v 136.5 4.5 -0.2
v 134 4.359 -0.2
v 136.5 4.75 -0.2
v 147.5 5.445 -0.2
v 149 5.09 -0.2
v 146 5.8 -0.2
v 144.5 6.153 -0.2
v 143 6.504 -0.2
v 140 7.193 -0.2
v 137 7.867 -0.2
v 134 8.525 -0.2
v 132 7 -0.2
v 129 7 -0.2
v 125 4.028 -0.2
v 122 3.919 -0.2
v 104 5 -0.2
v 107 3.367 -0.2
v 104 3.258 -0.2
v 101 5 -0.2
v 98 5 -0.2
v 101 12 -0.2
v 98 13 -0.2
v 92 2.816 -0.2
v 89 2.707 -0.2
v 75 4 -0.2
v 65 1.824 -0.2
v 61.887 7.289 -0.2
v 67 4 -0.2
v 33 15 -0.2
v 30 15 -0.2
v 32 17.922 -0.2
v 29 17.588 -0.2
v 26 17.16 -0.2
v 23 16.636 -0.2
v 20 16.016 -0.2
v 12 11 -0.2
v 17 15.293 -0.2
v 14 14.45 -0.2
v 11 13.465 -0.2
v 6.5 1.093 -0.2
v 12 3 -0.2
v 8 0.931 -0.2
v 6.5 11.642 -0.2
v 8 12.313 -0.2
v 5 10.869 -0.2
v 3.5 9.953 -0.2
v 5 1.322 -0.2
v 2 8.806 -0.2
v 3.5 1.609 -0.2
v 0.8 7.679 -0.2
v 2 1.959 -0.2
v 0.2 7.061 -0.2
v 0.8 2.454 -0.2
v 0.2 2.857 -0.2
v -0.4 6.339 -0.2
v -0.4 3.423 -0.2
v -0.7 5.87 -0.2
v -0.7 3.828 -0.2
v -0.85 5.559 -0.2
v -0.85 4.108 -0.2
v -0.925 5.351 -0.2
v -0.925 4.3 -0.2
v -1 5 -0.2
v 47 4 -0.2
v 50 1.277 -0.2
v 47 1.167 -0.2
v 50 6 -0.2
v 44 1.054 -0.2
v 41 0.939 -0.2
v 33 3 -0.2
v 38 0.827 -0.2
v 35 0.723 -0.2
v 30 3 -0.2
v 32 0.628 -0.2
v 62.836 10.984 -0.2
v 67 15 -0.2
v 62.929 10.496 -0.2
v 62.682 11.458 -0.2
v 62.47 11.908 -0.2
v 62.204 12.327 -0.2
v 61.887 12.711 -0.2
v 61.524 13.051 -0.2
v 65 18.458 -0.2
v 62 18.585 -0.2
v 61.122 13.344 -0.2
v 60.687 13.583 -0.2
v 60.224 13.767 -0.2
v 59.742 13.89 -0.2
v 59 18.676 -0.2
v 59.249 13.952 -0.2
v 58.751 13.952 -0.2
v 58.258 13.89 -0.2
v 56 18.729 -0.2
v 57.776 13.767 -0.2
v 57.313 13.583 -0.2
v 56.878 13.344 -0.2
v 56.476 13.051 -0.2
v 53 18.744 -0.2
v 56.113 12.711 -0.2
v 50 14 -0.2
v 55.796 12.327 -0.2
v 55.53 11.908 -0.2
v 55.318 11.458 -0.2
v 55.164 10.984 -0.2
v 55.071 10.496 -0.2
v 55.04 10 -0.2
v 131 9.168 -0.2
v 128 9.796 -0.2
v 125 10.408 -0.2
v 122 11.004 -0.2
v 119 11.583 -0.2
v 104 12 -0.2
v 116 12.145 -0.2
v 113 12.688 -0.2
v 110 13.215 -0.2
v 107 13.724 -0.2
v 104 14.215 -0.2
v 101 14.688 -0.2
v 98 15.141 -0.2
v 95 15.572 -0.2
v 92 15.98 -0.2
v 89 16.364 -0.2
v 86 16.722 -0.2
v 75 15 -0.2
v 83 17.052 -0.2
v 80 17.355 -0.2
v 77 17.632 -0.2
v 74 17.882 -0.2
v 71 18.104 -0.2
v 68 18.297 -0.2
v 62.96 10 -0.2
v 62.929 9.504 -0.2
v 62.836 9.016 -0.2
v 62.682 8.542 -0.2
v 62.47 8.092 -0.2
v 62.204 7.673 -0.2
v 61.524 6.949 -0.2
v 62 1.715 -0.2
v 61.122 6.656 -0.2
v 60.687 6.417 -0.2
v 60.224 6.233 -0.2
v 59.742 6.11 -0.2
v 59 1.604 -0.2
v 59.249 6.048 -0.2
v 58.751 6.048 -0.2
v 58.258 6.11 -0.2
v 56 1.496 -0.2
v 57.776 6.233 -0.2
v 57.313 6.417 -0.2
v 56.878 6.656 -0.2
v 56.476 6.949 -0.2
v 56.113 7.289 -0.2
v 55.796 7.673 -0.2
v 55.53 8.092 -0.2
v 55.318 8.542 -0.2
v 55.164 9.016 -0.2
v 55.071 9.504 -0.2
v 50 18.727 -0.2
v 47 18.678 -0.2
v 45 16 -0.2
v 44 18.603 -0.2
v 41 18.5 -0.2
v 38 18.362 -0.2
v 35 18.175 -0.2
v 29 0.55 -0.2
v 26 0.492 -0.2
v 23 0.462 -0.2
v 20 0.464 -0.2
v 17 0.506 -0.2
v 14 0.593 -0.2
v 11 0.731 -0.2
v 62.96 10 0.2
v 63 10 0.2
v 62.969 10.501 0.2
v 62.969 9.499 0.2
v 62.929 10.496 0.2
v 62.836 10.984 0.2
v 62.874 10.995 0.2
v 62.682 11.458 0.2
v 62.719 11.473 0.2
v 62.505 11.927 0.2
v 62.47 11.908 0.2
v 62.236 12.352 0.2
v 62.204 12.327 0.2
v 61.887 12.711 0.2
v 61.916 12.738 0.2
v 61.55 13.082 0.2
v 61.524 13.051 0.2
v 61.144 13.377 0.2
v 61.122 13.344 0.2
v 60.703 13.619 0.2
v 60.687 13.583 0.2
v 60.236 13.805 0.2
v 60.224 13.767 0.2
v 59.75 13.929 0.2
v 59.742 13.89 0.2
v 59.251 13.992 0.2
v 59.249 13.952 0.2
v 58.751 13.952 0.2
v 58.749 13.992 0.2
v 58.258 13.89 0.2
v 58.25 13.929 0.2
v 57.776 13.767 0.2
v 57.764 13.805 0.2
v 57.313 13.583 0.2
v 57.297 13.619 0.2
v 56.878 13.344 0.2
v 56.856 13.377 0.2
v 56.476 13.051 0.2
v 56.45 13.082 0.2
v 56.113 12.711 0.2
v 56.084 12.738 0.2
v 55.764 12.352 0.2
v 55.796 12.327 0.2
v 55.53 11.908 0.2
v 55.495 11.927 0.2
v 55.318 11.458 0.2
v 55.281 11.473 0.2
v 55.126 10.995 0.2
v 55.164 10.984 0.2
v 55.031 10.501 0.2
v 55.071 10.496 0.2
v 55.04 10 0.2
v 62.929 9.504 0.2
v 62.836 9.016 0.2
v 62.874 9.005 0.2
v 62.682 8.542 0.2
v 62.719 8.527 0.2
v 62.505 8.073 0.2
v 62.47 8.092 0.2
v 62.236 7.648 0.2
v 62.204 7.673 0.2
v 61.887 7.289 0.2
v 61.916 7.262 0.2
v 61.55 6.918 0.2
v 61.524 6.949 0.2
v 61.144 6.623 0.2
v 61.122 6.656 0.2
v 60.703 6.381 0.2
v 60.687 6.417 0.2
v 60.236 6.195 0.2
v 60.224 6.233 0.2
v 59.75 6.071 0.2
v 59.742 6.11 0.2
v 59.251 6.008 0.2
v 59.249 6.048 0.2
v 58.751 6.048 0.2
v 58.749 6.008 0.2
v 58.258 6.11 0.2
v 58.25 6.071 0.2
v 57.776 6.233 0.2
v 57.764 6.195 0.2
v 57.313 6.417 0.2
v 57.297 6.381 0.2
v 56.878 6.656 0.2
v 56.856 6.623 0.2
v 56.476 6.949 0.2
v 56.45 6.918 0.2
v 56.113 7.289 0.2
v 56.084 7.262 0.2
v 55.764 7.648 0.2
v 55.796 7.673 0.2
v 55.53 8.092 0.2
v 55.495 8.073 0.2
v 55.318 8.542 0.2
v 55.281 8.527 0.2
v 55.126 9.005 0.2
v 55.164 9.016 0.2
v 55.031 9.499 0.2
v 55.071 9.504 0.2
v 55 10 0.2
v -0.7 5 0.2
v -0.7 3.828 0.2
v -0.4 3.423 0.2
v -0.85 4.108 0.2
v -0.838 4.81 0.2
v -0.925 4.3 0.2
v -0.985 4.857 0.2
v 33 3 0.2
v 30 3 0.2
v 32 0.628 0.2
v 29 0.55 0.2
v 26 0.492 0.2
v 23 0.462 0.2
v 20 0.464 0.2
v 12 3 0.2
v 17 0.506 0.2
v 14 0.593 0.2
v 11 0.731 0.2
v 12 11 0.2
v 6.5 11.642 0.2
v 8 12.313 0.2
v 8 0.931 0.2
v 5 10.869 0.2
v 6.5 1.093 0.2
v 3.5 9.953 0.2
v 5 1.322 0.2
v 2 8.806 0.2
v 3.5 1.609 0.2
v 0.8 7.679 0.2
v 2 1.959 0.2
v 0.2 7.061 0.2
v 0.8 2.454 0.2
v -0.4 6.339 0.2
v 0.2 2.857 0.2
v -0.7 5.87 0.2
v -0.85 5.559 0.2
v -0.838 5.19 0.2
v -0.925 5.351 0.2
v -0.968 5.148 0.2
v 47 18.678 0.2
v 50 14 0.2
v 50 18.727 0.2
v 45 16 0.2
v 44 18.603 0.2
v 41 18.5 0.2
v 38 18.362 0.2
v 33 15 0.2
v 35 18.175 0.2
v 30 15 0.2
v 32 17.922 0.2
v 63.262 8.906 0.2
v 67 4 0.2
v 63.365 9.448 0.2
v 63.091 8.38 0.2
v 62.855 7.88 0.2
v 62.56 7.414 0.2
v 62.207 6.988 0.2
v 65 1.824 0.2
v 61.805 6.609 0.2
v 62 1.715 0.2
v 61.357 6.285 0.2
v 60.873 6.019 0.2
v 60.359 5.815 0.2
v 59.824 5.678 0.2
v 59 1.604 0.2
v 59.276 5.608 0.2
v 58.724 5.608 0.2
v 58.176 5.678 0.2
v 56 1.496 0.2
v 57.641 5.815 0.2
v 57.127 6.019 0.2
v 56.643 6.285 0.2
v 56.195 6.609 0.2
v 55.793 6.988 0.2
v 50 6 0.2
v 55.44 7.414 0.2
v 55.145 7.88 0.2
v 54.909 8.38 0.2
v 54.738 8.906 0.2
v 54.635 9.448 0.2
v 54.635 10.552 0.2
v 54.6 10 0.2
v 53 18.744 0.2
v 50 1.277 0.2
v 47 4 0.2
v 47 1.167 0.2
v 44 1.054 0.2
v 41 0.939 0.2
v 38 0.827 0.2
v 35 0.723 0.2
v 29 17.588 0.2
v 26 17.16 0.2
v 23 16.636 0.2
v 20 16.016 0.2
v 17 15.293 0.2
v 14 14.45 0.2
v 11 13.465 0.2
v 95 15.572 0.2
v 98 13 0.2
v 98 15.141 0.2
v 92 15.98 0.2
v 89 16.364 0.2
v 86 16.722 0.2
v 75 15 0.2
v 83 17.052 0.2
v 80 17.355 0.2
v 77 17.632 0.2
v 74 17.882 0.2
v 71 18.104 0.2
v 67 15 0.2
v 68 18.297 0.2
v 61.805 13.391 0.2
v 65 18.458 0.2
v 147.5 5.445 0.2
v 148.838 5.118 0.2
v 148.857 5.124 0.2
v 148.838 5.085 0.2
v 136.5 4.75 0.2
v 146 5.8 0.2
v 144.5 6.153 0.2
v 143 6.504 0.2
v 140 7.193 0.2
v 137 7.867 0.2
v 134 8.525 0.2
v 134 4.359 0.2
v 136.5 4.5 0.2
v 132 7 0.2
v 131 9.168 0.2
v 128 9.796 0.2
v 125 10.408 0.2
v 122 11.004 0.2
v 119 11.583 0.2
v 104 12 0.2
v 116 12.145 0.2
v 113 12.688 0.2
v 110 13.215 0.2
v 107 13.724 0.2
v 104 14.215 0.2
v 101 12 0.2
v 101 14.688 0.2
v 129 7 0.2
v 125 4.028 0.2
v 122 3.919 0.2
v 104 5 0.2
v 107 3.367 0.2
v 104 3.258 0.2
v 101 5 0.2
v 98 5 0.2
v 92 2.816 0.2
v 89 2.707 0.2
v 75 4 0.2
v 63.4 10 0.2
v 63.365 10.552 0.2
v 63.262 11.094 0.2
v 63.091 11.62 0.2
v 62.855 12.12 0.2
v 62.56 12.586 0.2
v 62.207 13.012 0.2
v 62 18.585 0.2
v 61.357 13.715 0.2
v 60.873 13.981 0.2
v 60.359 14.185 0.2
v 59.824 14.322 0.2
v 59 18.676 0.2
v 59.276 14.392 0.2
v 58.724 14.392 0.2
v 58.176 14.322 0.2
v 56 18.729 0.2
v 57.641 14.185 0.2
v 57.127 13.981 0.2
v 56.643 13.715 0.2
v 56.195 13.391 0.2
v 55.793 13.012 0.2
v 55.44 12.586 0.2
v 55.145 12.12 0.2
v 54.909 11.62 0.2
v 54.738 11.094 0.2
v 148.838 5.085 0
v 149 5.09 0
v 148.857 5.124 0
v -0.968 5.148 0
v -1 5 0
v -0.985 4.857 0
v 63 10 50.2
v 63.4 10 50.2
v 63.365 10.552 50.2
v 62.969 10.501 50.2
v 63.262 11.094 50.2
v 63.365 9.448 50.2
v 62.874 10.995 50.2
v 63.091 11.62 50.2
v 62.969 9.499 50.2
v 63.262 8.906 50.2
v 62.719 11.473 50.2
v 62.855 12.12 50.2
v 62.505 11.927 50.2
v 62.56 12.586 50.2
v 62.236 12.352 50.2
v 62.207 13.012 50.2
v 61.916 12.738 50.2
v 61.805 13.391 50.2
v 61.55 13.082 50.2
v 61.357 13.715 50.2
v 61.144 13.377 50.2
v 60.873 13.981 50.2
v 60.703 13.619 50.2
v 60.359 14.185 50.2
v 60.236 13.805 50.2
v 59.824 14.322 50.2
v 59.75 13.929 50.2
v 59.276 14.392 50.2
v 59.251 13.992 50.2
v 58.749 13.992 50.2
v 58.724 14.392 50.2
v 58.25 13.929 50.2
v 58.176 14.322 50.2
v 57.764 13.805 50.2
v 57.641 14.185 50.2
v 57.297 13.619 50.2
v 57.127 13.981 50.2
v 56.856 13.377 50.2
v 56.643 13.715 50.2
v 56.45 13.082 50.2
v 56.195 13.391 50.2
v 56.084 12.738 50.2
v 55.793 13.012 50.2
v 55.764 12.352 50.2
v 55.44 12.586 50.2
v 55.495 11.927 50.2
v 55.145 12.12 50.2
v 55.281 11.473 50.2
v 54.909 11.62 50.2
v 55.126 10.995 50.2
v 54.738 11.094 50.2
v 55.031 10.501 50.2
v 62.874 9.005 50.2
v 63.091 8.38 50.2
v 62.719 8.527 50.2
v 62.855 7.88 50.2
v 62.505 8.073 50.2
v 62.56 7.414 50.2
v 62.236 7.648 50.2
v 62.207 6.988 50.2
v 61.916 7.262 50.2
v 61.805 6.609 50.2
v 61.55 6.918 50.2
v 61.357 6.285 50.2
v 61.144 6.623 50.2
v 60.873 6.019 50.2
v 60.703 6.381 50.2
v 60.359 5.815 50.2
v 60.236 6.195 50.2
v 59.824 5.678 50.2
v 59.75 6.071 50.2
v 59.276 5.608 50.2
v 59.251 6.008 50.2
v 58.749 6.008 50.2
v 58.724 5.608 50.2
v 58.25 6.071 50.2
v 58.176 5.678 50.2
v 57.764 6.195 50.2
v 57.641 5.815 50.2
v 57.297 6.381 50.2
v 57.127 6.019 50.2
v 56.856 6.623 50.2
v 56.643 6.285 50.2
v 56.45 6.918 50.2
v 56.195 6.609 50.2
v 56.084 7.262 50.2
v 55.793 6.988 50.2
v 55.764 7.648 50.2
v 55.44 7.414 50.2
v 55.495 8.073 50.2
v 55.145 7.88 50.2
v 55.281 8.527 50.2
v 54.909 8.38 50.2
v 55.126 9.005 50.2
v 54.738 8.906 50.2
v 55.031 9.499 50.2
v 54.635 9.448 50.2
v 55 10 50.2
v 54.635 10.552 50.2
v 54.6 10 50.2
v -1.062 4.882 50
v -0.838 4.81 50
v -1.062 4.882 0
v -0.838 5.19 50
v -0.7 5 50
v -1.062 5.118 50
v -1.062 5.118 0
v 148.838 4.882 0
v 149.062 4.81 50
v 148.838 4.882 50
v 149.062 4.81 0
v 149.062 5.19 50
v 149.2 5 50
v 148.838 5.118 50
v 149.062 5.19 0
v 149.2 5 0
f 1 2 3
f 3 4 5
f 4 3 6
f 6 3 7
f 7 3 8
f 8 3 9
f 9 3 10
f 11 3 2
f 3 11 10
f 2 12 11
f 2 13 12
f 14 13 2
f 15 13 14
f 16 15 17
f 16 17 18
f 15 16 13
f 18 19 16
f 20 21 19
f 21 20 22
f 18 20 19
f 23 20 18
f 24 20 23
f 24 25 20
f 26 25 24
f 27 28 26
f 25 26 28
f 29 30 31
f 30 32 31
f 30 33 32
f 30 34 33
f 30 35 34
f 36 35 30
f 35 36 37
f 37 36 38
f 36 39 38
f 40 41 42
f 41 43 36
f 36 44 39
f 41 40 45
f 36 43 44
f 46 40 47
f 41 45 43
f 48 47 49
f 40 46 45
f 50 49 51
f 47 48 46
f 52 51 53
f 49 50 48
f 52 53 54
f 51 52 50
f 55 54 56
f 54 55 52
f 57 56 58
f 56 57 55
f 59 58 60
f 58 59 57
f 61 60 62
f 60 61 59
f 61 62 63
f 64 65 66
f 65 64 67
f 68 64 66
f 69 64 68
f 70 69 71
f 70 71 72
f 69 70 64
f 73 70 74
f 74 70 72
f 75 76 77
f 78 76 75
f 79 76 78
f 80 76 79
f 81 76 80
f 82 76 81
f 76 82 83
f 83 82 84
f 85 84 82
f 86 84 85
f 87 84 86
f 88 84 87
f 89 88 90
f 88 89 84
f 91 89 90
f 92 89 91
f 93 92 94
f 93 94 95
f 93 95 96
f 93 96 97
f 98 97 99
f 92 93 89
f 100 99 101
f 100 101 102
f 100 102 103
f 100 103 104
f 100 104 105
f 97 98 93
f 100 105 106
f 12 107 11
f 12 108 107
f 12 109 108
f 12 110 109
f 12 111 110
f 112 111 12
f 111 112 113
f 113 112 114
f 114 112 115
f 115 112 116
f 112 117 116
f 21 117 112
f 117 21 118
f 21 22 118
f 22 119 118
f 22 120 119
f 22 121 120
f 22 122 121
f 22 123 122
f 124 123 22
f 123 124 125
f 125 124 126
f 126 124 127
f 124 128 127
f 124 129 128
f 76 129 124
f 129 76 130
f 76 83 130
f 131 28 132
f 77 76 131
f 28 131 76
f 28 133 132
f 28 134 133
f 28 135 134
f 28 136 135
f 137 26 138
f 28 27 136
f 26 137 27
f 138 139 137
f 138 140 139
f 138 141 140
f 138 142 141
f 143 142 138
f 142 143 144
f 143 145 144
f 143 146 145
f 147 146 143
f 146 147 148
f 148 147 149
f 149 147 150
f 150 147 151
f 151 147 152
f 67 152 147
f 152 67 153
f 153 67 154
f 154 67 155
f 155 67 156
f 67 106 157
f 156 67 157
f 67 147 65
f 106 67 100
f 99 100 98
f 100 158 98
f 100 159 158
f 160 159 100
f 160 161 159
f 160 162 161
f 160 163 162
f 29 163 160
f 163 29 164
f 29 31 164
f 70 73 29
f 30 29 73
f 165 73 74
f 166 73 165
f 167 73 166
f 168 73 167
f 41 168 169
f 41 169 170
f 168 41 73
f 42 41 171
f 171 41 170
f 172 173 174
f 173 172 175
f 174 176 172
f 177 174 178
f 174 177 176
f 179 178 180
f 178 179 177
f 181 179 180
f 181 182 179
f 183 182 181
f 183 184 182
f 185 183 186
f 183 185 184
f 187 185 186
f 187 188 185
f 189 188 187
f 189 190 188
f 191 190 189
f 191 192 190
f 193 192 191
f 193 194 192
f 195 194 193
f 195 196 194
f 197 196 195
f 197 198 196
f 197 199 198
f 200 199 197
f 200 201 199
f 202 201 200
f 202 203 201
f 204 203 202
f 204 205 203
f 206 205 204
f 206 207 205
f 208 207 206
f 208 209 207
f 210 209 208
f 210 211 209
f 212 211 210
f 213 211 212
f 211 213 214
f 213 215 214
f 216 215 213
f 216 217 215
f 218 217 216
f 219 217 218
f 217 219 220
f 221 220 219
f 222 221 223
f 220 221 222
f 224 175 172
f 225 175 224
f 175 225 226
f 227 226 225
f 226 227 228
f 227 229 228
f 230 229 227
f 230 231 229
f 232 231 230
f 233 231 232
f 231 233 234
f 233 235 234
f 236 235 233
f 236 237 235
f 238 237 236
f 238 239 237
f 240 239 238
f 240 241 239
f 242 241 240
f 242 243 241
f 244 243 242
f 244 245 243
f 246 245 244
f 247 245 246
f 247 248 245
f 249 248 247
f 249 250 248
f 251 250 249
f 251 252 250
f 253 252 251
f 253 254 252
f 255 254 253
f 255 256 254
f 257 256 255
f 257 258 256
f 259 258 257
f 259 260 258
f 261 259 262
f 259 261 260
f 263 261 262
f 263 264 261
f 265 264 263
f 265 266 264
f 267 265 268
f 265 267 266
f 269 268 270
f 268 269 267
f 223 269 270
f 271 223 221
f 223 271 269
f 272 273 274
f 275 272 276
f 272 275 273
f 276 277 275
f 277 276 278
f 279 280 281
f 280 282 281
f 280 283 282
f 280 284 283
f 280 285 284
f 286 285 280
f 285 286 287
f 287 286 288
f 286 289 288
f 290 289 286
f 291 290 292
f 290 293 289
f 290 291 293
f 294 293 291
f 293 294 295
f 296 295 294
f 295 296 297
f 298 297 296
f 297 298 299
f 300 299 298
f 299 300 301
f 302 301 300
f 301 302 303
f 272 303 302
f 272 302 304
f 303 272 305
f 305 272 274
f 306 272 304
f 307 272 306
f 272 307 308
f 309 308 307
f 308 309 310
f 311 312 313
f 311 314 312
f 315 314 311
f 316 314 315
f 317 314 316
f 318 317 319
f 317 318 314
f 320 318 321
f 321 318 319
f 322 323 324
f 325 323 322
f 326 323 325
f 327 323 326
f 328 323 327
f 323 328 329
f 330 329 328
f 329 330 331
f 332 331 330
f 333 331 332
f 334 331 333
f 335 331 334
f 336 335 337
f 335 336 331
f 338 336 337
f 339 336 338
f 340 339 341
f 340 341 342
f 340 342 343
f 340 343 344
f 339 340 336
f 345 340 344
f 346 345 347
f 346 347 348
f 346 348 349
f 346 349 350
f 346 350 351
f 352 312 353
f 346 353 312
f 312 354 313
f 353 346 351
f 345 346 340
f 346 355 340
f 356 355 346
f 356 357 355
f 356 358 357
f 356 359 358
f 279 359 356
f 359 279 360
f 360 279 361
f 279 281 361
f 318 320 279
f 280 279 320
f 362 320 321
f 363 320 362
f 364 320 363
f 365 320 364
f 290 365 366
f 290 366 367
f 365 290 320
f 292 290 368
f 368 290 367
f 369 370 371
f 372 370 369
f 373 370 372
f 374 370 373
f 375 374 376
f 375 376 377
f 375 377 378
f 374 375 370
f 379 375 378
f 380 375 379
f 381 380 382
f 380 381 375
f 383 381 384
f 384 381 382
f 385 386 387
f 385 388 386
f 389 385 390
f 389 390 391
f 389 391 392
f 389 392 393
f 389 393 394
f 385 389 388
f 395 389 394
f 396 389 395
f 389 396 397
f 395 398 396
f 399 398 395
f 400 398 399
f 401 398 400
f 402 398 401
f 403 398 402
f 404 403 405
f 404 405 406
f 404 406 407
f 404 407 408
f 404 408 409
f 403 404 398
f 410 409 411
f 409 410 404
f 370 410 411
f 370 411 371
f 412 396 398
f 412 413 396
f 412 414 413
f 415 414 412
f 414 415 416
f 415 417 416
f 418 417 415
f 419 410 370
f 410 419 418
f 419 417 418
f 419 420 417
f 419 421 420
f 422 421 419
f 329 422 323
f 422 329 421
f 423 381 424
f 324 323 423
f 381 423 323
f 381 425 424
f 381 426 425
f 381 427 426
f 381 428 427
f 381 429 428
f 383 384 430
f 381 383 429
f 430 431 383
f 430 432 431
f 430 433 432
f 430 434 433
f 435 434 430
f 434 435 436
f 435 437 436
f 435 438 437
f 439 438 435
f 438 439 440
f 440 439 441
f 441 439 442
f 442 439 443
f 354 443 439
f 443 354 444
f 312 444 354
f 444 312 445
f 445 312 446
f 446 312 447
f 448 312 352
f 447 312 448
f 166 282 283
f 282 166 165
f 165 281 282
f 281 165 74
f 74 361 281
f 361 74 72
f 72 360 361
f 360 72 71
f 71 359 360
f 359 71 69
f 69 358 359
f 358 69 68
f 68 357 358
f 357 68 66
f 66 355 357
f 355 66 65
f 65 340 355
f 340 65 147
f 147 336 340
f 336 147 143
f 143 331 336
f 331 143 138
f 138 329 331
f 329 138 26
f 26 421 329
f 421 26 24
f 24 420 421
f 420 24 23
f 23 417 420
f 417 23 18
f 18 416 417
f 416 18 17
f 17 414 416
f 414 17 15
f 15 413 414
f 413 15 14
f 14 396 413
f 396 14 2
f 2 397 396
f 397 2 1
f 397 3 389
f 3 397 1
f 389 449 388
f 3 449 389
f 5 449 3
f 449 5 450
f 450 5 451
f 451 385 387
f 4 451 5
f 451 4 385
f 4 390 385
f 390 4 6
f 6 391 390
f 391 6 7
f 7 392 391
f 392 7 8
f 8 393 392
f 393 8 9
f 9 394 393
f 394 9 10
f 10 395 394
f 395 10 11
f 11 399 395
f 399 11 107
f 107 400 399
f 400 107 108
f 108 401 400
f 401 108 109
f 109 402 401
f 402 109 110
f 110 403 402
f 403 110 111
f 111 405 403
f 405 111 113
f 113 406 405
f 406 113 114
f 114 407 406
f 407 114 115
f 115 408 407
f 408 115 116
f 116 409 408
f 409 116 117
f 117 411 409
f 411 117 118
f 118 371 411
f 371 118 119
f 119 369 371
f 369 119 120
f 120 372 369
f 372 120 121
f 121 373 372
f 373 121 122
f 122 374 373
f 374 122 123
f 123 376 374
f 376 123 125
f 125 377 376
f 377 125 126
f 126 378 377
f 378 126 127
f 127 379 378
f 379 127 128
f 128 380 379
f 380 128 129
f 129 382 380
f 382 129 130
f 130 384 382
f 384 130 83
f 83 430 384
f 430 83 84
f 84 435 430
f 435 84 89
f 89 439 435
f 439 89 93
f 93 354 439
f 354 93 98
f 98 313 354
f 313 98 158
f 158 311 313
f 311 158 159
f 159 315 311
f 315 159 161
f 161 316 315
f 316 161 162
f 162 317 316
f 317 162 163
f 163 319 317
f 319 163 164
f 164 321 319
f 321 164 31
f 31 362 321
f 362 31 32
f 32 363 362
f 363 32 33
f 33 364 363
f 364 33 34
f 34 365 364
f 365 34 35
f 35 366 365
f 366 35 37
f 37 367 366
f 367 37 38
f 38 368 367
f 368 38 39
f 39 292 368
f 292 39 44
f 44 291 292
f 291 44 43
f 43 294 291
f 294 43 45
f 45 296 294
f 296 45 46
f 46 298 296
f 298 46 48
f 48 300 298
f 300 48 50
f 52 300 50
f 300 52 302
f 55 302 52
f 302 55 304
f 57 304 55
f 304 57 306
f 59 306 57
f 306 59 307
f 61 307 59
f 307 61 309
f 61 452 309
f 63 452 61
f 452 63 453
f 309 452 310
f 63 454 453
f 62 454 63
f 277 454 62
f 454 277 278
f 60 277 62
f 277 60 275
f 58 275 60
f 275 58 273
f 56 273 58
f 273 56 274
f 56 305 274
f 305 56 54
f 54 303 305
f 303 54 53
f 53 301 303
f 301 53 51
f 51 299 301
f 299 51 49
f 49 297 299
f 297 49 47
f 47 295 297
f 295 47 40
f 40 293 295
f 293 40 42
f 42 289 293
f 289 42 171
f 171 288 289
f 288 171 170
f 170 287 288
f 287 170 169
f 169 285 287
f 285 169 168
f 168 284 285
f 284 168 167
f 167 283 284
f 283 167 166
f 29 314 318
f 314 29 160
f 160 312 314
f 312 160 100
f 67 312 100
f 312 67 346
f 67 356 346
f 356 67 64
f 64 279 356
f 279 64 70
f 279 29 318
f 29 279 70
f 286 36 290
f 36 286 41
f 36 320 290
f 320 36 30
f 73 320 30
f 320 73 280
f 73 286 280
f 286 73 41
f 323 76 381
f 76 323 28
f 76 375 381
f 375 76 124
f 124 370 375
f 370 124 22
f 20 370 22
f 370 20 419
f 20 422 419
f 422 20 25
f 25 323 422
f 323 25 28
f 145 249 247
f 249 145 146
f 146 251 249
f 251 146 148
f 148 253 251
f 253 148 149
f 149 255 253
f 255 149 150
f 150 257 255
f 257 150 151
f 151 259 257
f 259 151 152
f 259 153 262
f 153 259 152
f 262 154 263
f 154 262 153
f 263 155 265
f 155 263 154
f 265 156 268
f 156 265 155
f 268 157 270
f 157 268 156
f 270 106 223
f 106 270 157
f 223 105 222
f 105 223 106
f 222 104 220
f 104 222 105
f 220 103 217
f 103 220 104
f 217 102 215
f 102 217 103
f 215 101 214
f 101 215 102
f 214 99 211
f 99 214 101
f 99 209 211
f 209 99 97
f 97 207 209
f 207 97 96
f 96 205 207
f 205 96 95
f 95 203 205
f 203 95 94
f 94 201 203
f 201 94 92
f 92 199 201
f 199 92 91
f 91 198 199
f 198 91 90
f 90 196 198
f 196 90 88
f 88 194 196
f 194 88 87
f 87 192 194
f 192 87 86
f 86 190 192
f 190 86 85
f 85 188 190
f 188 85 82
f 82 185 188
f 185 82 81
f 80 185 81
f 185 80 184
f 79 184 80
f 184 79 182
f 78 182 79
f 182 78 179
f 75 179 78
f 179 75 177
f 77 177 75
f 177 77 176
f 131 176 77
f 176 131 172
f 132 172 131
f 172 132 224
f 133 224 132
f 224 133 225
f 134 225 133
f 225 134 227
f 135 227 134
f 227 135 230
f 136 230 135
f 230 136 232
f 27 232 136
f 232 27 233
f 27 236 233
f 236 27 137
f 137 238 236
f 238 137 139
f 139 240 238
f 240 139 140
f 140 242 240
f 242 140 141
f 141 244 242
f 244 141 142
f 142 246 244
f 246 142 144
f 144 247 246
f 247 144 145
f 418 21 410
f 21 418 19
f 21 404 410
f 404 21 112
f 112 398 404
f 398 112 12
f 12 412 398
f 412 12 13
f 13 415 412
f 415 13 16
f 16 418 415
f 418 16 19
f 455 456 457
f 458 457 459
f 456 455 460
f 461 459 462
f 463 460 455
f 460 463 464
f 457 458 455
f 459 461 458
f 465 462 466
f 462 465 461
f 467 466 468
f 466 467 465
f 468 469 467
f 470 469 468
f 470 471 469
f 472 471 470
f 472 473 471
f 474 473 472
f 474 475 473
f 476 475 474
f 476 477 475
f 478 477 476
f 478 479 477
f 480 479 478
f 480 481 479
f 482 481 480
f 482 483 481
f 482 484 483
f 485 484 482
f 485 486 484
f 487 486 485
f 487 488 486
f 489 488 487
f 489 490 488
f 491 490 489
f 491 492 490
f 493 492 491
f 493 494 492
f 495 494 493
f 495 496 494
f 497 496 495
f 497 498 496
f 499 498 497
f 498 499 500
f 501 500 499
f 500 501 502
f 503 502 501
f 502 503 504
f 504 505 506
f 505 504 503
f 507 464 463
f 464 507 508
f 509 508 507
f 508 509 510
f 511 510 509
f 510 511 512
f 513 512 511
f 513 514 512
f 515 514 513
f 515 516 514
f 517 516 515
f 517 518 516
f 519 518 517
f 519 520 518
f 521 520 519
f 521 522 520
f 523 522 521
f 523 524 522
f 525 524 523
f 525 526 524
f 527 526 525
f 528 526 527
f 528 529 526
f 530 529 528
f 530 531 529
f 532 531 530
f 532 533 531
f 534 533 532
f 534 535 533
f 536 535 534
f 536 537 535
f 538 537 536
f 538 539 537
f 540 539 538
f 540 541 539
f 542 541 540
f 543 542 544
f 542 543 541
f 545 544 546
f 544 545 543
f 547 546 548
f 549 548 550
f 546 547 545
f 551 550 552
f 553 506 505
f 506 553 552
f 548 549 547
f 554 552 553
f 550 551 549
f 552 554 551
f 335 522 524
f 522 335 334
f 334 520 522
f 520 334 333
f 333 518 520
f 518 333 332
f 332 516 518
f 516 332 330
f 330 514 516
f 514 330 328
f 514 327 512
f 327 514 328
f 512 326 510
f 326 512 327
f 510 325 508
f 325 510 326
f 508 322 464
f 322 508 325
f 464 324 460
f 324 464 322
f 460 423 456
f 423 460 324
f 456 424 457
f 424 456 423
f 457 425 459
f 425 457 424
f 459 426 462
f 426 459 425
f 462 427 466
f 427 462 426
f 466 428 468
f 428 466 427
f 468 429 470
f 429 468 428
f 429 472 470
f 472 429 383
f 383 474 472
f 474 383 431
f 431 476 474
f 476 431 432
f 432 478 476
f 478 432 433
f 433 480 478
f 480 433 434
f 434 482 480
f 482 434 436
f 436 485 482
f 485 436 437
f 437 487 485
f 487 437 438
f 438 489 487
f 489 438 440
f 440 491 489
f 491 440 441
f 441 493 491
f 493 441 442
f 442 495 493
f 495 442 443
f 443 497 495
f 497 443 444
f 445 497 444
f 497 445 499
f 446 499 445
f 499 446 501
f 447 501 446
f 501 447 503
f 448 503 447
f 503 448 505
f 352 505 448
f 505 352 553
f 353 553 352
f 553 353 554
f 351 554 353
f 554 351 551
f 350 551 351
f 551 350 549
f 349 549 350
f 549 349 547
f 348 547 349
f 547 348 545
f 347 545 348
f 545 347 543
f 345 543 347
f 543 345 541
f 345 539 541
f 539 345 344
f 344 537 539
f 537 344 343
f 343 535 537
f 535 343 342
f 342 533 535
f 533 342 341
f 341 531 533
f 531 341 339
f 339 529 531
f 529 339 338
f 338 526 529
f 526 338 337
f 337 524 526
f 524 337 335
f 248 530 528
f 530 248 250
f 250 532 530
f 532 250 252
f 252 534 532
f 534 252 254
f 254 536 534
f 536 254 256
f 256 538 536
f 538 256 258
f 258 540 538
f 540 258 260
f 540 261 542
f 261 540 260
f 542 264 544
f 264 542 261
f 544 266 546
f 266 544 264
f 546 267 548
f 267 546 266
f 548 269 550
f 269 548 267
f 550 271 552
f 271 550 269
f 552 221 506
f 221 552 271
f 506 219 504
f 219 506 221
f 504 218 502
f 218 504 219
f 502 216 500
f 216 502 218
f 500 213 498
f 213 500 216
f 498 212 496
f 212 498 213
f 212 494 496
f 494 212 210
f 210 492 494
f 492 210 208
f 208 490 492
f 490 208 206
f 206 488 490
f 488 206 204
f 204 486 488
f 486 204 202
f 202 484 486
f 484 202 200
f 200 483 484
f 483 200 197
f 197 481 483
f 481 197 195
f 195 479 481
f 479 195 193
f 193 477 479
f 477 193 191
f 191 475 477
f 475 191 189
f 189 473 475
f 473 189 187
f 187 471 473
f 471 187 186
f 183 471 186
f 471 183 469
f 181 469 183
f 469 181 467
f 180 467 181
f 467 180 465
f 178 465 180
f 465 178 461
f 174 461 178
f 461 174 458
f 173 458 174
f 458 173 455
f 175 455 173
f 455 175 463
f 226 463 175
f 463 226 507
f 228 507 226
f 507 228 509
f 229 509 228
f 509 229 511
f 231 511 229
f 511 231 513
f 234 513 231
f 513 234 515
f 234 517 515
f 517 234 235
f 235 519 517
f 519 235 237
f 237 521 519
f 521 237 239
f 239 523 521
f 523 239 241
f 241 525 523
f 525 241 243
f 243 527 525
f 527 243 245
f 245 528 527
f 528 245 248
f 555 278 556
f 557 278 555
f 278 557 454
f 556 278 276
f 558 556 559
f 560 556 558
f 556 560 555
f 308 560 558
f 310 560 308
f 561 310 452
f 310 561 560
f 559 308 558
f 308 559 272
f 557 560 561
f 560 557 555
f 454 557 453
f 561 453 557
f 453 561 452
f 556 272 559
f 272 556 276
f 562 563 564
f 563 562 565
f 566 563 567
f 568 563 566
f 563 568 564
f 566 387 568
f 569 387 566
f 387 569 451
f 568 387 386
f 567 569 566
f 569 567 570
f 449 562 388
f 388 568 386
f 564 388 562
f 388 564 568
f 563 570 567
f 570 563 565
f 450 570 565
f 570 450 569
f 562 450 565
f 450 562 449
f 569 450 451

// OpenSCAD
color("lightgray")
    linear_extrude(height=0.4, center=true)
        import("../dxf/clarky_120mm_main.dxf",$fn=50);

translate([59,10,25.2 ])
	color("darkgray")
    	linear_extrude(height=50, center=true)
       		import("../dxf/circle_r4_4.dxf",$fn=50);

translate([-0.9,5,0])
	color("darkgray")	
		cylinder(50,0.2,0.2);


translate([149,5,0])
	color("darkgray")	
		cylinder(50,0.2,0.2);
